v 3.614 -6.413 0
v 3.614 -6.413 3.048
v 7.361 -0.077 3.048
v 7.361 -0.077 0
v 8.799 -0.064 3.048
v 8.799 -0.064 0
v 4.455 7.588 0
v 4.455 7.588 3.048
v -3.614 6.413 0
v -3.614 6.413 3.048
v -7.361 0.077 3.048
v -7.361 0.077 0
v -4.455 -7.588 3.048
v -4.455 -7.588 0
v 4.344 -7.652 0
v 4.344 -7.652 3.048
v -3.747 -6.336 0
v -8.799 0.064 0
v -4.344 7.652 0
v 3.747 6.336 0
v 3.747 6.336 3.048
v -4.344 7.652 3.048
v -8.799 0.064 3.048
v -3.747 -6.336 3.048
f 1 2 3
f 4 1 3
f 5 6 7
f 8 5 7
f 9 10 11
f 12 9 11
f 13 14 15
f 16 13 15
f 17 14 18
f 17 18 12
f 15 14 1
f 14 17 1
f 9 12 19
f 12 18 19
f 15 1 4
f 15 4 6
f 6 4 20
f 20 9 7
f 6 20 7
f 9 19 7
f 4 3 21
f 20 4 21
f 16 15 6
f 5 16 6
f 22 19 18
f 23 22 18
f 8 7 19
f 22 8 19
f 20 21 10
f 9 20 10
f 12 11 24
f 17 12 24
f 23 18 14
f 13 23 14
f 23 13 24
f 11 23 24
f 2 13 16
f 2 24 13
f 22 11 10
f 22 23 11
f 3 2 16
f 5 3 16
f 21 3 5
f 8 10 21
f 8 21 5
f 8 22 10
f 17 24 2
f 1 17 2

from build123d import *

# Parameters (mm, degrees)
F1_DEPTH = 3.048
F3_DEPTH = 88.646


with BuildPart() as f1:
    # F0 (on Top) → F1 (new body)
    with BuildSketch(Plane.XY):
        Polygon((4.34401, -7.651717), (8.798587, -0.063836), (4.454577, 7.587881), (-4.34401, 7.651717), (-8.798587, 0.063836), (-4.454577, -7.587881), align=None)
    extrude(amount=F1_DEPTH)

    # F2 (on face) → F3 (cut)
    with BuildSketch(Plane.XY.offset(3.048)):
        Polygon((7.360816, -0.076723), (3.746852, 6.336292), (-3.613964, 6.413015), (-7.360816, 0.076723), (-3.746852, -6.336292), (3.613964, -6.413015), align=None)
    extrude(amount=-F3_DEPTH, mode=Mode.SUBTRACT)


solid = f1.part
